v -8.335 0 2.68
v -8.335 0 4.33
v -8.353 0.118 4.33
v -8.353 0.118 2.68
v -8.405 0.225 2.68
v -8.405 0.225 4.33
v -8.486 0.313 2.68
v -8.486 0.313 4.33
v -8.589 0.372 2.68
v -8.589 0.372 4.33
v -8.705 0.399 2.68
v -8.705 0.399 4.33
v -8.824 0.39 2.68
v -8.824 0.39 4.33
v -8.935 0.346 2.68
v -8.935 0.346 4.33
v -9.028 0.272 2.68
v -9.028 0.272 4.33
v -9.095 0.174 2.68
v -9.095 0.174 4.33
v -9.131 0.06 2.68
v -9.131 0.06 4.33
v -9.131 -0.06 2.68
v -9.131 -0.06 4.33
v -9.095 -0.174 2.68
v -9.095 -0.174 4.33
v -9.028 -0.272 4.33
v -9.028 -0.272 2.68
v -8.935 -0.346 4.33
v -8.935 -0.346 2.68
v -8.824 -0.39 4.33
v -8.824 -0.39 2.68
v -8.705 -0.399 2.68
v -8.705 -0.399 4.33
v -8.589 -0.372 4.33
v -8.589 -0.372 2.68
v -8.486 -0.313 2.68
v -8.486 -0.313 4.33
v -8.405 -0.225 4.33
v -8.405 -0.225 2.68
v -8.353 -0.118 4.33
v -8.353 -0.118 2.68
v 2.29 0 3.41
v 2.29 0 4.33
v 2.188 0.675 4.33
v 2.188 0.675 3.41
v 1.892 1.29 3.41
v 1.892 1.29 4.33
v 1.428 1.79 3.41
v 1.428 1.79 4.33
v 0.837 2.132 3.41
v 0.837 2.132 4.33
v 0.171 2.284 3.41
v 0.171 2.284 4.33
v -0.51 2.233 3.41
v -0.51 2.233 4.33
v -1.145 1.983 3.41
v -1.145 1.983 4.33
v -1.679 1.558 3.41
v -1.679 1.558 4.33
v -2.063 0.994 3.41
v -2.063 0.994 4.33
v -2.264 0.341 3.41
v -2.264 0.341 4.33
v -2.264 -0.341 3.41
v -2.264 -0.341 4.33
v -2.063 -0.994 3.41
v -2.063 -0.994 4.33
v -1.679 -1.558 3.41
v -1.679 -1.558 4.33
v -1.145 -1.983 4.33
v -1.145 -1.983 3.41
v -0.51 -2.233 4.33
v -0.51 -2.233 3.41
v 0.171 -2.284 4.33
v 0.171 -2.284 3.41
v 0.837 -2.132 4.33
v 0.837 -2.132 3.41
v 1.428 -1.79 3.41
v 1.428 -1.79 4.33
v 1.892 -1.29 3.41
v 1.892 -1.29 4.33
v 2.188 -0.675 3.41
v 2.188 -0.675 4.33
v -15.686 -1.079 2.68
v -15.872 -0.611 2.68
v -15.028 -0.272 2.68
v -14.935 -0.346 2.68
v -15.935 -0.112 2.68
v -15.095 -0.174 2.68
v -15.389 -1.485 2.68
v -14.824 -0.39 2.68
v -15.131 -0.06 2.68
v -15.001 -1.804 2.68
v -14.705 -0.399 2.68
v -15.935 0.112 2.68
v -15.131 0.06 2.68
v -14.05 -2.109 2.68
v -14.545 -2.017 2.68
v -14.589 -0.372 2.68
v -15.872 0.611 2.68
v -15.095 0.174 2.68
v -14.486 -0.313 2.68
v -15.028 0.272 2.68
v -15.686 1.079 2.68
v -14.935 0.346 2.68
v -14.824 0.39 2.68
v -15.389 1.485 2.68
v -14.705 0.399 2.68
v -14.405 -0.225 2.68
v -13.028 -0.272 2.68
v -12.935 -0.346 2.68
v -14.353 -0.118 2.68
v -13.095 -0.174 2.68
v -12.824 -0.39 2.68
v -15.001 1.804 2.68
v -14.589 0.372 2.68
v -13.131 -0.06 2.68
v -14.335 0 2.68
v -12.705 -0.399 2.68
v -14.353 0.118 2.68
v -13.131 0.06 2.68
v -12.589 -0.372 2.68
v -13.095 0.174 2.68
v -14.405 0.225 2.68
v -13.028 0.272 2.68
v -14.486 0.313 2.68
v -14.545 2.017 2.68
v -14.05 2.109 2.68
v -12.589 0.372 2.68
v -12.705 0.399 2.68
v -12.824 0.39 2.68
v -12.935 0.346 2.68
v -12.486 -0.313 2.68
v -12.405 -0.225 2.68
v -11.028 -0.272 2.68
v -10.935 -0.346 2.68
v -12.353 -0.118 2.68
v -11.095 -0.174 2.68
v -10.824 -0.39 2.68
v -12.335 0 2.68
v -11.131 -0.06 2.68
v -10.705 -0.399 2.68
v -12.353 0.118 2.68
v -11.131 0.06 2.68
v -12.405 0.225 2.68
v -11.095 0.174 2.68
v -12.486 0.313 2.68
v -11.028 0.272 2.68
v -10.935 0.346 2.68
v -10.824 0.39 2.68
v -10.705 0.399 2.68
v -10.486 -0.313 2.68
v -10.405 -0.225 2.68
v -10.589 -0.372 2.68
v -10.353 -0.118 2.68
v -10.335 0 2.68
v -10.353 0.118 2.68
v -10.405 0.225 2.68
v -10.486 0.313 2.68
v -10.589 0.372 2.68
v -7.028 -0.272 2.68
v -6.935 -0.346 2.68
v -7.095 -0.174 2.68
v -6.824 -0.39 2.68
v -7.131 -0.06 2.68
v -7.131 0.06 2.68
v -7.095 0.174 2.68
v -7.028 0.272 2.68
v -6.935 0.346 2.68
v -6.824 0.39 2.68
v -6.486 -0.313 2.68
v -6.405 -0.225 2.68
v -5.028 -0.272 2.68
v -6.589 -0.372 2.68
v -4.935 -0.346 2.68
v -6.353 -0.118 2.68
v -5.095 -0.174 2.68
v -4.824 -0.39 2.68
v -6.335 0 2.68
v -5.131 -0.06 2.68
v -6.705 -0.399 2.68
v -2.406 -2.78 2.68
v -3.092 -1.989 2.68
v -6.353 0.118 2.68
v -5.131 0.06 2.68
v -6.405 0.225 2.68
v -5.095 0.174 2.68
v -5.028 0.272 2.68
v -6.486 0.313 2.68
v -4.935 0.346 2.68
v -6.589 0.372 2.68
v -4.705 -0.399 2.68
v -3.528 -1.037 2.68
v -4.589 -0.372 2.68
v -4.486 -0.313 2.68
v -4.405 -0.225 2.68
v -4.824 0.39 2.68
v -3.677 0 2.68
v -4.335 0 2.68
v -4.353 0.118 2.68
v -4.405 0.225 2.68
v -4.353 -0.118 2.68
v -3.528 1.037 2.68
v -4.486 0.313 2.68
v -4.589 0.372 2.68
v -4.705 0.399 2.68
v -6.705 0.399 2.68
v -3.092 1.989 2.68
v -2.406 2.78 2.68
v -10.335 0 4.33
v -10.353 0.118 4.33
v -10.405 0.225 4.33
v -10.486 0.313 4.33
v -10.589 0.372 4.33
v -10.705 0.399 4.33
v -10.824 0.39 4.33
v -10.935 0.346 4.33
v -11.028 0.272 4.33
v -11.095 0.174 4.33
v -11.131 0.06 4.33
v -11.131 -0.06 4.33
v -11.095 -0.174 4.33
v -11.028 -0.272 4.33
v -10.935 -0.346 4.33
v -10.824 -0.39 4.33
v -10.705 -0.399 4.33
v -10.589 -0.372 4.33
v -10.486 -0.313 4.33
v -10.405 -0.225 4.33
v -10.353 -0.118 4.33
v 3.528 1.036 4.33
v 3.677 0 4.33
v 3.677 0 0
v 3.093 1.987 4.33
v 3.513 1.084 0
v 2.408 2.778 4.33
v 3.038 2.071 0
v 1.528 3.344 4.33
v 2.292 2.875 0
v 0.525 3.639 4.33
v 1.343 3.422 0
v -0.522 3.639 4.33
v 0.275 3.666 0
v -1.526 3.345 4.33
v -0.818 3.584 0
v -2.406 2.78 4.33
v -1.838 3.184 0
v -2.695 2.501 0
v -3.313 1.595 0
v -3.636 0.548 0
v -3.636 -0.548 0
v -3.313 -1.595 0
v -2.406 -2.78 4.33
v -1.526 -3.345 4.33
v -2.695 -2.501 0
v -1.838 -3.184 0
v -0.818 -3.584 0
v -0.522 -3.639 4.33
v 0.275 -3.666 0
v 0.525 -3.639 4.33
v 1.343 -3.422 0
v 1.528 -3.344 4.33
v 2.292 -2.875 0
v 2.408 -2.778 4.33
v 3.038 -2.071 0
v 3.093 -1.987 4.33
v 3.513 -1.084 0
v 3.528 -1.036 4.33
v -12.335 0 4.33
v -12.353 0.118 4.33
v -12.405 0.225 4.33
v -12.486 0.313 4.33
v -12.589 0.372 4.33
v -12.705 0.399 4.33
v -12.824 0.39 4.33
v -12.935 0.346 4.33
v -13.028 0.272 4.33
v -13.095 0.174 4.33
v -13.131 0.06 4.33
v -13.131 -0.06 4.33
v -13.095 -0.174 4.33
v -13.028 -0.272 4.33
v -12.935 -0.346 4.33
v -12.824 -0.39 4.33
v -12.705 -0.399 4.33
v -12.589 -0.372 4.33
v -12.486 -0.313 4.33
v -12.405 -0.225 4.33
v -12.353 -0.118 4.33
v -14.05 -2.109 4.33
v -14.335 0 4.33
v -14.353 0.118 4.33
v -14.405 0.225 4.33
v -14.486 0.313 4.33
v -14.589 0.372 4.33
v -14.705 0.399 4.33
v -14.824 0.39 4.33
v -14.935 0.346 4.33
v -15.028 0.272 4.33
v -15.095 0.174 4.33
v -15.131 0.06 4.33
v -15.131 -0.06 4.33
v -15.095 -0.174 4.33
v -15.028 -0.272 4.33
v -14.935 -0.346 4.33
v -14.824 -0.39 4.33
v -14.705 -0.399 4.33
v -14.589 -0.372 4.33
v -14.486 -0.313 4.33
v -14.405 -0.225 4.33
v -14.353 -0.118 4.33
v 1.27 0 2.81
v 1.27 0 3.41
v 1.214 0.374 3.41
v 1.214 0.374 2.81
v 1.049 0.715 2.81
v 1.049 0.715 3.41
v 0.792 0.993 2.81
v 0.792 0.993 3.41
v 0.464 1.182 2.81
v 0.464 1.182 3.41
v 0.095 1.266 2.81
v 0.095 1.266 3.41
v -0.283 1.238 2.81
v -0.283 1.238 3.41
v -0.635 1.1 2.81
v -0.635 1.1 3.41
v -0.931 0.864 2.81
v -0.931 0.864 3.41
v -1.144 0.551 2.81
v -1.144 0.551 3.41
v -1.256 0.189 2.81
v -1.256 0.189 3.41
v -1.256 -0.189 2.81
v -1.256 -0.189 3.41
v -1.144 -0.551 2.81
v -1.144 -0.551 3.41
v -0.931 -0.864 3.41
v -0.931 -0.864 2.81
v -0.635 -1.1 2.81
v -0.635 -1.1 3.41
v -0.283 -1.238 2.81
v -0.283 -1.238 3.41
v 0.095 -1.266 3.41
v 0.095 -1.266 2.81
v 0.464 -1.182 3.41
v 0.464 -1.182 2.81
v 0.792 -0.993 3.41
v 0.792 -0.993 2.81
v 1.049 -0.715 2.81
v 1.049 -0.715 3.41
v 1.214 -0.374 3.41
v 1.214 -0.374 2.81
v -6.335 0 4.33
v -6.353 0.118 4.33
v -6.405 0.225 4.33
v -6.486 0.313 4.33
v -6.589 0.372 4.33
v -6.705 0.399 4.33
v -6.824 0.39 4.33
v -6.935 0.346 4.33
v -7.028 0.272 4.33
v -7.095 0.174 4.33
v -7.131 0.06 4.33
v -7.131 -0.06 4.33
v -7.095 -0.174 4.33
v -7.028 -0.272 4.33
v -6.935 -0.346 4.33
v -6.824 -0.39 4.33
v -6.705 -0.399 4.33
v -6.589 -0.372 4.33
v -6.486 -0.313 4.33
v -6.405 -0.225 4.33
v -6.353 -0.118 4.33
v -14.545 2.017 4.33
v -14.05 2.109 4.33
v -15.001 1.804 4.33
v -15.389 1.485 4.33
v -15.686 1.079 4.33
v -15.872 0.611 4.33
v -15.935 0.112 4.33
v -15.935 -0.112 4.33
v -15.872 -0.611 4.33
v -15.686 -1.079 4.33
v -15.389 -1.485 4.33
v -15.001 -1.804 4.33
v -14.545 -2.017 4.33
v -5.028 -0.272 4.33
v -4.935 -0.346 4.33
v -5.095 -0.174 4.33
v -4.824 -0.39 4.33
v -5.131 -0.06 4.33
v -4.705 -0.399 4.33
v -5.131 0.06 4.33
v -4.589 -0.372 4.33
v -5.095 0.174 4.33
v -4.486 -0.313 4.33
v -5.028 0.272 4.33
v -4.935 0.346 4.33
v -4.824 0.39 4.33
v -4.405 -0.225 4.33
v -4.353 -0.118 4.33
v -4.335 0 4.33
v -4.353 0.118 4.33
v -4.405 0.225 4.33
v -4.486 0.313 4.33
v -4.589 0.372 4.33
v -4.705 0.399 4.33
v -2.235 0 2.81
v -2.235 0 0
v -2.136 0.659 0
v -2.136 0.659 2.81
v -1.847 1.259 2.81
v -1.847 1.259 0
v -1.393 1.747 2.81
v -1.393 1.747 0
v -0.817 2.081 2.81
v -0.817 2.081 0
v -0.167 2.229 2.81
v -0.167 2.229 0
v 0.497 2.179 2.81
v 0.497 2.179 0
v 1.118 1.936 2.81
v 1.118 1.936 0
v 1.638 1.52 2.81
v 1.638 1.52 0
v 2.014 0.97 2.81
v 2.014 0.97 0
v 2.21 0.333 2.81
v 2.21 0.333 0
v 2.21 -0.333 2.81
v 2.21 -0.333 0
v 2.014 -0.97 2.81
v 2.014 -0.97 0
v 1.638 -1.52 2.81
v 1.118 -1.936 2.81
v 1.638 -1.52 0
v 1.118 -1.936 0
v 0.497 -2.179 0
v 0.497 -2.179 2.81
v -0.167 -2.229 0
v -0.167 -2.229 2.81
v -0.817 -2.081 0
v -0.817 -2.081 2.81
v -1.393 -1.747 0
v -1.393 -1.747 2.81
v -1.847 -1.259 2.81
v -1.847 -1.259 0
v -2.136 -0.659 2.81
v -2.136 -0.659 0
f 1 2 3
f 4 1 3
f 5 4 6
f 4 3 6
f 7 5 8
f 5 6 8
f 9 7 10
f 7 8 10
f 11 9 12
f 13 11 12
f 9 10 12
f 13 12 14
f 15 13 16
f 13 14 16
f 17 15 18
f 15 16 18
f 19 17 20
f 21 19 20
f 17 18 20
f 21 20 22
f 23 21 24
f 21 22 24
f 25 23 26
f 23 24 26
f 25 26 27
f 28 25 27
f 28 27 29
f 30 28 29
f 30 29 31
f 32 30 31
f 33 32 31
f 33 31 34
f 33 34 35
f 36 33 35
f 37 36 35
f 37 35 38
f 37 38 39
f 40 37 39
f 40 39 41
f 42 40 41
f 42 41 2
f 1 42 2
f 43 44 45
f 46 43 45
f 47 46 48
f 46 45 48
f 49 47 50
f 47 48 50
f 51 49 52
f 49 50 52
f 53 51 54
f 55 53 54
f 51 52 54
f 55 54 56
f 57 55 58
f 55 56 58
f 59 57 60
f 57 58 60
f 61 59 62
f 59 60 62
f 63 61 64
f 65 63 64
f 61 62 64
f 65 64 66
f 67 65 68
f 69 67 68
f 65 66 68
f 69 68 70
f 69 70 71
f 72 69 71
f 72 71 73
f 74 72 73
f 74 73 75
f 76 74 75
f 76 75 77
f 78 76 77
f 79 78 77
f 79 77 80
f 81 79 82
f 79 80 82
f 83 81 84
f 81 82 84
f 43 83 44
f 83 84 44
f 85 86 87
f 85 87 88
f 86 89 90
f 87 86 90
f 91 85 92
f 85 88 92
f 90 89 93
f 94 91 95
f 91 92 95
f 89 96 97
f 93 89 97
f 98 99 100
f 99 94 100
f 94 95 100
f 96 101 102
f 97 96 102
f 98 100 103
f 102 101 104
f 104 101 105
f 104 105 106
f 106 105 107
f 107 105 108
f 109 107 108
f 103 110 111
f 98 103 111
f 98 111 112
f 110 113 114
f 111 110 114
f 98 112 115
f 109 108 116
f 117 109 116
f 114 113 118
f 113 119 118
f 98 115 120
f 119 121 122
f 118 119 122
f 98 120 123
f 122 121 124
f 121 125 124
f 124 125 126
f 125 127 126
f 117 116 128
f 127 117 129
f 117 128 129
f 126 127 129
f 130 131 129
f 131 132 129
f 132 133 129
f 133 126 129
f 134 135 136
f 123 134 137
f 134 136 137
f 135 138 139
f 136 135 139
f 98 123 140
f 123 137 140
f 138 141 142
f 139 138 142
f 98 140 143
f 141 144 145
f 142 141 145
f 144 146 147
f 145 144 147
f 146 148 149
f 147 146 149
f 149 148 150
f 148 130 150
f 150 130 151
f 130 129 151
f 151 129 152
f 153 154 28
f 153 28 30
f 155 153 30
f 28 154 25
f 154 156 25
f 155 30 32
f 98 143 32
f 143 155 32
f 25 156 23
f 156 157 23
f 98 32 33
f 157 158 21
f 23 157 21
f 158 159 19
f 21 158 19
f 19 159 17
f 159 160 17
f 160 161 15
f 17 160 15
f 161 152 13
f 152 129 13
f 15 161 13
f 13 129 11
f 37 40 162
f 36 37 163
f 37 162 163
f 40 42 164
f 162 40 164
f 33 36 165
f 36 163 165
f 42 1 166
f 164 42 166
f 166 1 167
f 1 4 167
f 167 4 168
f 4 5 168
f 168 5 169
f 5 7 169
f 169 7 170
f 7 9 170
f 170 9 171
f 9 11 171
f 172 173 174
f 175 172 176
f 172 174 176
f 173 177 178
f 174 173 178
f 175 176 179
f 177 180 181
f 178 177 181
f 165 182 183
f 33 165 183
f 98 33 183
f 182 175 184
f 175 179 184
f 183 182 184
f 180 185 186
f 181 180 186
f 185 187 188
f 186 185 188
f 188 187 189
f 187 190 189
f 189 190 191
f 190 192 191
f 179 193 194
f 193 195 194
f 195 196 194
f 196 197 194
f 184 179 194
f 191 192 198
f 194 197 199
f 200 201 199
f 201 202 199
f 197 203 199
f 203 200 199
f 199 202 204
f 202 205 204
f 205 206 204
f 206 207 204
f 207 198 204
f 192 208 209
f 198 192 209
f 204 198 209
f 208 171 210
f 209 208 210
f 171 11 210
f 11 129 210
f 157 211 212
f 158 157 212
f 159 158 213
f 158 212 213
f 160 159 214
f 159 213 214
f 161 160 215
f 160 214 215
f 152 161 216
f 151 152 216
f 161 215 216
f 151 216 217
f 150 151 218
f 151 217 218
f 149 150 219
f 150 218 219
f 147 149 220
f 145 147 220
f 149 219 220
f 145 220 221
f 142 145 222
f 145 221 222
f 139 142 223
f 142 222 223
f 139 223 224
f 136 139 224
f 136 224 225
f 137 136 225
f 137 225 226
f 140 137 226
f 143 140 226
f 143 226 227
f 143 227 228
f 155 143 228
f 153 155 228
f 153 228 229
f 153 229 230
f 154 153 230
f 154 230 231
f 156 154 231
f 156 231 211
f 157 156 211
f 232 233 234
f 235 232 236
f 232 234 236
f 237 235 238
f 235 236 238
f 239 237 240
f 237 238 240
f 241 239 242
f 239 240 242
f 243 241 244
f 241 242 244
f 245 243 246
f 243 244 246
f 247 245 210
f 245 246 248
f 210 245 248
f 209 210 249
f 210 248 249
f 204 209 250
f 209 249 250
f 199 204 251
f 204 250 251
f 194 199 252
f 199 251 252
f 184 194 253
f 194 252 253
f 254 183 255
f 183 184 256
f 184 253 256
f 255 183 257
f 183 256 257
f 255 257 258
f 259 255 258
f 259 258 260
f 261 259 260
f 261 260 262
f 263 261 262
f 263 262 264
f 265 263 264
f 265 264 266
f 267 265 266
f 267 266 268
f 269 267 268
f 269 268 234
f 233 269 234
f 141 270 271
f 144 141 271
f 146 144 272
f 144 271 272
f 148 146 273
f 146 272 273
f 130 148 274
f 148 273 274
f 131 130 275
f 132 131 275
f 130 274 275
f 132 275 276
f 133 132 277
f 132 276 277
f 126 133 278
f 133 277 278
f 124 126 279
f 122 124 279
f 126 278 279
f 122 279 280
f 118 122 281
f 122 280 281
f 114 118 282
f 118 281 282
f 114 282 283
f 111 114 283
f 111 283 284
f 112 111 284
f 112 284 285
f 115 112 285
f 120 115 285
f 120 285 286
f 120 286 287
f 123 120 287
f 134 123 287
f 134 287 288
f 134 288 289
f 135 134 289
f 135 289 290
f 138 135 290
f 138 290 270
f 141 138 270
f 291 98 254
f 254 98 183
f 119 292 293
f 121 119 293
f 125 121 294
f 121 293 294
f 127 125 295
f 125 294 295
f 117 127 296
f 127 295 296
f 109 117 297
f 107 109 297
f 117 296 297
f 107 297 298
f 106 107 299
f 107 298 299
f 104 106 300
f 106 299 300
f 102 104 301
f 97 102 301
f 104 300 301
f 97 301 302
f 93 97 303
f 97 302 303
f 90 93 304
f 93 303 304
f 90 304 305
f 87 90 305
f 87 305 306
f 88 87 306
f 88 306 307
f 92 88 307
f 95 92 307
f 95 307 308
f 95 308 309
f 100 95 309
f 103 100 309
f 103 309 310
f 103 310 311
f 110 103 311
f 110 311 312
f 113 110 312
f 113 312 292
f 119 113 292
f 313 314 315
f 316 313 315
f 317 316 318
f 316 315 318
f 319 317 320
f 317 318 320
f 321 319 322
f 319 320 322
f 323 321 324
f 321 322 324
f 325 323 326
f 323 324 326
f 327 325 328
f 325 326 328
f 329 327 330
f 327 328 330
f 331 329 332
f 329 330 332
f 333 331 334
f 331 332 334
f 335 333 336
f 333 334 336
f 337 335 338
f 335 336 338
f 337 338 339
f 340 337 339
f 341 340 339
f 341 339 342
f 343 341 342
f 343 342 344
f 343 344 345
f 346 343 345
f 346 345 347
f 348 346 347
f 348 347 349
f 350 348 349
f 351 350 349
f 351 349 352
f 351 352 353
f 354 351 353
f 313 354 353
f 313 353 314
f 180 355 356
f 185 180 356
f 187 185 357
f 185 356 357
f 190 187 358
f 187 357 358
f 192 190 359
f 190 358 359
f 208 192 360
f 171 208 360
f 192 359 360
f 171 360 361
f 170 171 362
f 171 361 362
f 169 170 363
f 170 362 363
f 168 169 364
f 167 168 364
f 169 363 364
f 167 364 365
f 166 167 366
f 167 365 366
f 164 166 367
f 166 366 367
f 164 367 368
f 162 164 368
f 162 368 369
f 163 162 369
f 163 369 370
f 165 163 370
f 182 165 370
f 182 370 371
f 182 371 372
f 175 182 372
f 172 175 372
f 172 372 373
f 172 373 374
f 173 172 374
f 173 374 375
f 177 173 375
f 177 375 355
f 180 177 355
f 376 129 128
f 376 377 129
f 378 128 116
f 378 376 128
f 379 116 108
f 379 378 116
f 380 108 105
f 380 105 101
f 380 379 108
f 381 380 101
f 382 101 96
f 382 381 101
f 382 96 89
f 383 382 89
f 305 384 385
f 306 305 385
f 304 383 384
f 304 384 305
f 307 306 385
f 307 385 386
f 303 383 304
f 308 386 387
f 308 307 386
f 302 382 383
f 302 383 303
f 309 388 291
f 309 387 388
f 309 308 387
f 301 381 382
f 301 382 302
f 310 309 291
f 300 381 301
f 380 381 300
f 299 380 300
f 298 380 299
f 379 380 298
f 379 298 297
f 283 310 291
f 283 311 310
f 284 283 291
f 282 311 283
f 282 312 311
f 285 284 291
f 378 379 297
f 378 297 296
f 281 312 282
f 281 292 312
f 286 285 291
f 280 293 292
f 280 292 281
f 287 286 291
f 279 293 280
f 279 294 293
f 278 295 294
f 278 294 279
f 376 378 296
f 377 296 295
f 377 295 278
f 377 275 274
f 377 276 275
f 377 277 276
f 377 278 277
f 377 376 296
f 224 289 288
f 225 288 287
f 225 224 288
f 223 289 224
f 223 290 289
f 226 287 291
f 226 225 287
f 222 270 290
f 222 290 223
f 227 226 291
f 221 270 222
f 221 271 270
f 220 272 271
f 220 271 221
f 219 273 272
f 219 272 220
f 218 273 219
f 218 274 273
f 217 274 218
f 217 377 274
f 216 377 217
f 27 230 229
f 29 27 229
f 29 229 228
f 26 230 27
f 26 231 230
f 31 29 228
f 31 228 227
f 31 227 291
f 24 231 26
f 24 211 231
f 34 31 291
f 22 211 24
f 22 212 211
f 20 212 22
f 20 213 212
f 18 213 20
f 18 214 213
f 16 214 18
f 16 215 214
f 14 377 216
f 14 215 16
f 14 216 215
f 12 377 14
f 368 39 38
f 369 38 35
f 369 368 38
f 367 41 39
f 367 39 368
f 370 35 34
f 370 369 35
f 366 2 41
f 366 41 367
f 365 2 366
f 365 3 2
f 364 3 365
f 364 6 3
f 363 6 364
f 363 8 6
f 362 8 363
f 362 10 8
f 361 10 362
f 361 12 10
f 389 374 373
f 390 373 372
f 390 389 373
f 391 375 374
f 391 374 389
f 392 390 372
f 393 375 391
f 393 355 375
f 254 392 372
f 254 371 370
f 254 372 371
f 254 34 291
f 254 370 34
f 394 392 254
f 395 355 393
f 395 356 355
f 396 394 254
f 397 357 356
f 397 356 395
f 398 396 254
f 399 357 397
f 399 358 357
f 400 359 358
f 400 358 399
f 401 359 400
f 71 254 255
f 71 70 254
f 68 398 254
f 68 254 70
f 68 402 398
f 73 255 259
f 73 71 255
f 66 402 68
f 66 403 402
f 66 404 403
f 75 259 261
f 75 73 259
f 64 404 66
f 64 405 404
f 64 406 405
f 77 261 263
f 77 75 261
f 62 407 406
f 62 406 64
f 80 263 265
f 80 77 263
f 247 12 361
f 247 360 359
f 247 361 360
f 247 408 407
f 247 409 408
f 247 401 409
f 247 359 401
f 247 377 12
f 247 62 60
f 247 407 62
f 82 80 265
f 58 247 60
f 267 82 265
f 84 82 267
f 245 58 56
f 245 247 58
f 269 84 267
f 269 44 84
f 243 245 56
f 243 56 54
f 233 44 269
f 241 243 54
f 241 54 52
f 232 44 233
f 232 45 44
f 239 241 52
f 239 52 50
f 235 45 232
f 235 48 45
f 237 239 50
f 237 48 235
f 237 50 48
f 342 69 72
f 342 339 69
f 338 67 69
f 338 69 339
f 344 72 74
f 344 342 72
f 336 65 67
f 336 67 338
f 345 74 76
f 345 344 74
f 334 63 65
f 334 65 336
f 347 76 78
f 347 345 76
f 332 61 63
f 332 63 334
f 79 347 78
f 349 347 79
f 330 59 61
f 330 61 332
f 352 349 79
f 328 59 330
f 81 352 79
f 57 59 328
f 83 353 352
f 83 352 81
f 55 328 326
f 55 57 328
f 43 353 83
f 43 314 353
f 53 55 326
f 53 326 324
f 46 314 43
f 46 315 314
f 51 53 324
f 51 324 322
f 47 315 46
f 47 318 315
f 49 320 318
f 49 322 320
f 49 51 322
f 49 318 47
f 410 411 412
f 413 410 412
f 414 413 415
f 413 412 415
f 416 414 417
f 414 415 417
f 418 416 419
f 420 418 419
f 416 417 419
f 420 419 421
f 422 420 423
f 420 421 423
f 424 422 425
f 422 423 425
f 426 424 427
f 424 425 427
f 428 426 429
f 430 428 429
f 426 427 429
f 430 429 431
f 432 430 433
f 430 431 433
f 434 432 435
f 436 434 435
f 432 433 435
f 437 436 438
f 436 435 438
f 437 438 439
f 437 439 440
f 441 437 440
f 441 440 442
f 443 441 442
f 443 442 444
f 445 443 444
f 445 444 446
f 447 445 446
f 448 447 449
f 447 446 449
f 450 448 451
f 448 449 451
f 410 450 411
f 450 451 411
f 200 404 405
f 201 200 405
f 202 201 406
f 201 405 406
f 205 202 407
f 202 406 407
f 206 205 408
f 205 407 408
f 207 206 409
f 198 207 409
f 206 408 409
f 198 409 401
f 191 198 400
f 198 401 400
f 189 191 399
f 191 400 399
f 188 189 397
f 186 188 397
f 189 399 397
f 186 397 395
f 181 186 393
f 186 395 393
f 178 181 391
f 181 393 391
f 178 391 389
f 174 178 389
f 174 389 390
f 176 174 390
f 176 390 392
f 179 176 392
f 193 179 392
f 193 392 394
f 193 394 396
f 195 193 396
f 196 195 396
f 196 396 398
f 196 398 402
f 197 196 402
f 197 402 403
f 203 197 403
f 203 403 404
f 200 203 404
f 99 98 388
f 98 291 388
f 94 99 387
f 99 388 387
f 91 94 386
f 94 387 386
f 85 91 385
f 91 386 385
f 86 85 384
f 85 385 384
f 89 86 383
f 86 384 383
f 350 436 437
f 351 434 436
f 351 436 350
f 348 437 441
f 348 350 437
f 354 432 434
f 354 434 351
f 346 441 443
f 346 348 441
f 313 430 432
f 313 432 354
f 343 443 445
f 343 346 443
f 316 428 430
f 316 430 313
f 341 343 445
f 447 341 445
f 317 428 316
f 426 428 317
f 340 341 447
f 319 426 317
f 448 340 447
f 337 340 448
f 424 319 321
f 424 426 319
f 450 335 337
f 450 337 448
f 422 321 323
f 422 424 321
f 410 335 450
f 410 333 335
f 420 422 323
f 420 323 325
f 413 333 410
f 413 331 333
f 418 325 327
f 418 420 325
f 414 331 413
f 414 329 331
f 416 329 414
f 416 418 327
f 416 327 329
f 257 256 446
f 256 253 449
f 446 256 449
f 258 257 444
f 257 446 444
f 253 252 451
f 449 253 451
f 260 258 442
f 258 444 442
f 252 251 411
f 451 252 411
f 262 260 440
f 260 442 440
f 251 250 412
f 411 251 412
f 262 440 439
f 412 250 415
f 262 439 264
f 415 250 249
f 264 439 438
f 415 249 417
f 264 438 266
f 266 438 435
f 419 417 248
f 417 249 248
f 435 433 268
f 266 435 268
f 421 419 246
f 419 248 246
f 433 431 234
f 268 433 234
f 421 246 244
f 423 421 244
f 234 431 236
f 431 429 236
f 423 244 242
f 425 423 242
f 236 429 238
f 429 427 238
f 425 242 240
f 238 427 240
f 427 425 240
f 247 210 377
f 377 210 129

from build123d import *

# Parameters (mm, degrees)
SKETCH1_R           = 3.67665
BOSS_EXTRUDE1_DEPTH = 4.33
SKETCH2_R           = 2.235
CUT_EXTRUDE1_DEPTH  = 2.81
SKETCH3_R           = 2.29
CUT_EXTRUDE2_DEPTH  = 0.92
SKETCH4_R           = 1.27
CUT_EXTRUDE3_DEPTH  = 7.218006951
BOSS_EXTRUDE2_START = -1.65
BOSS_EXTRUDE2_DEPTH = 1.65
FILLET1_R           = 2
SKETCH6_R           = 0.4
CUT_EXTRUDE4_DEPTH  = 17.917177076


with BuildPart() as part:
    # Sketch1 → Boss-Extrude1 (new body)
    with BuildSketch(Plane.XY):
        Circle(SKETCH1_R)
    extrude(amount=BOSS_EXTRUDE1_DEPTH)

    # Sketch2 → Cut-Extrude1 (cut)
    with BuildSketch(Plane(origin=(0, 0, 0), x_dir=(-1, 0, 0), z_dir=(0, 0, -1))):
        Circle(SKETCH2_R)
    extrude(amount=-CUT_EXTRUDE1_DEPTH, mode=Mode.SUBTRACT)

    # Sketch3 → Cut-Extrude2 (cut)
    with BuildSketch(Plane.XY.offset(4.33)):
        Circle(SKETCH3_R)
    extrude(amount=-CUT_EXTRUDE2_DEPTH, mode=Mode.SUBTRACT)

    # Sketch4 → Cut-Extrude3 (cut, through all)
    with BuildSketch(Plane.XY.offset(3.41)):
        Circle(SKETCH4_R)
    extrude(amount=-CUT_EXTRUDE3_DEPTH, mode=Mode.SUBTRACT)

    # Sketch5 → Boss-Extrude2 (add)
    with BuildSketch(Plane.XY.offset(4.33).offset(BOSS_EXTRUDE2_START)):
        with BuildLine():
            ThreePointArc((-2.406107899, -2.78), (-3.67665, 0), (-2.406107899, 2.78))
            Line((-2.406107899, 2.78), (-15.935, 2))
            Line((-15.935, 2), (-15.935, -2))
            Line((-15.935, -2), (-2.406107899, -2.78))
        make_face()
    extrude(amount=BOSS_EXTRUDE2_DEPTH)

    # Fillet1
    fillet1_edges = [part.edges().sort_by_distance(p)[0] for p in [
        (-15.935, -2, 3.505),
        (-15.935, 2, 3.505),
    ]]
    fillet(fillet1_edges, radius=FILLET1_R)

    # Sketch6 → Cut-Extrude4 (cut, through all)
    with BuildSketch(Plane.XY.offset(4.33)):
        with Locations((-14.735, 0)):
            Circle(SKETCH6_R)
        with Locations((-12.735, 0)):
            Circle(SKETCH6_R)
        with Locations((-10.735, 0)):
            Circle(SKETCH6_R)
        with Locations((-8.735, 0)):
            Circle(SKETCH6_R)
        with Locations((-6.735, 0)):
            Circle(SKETCH6_R)
        with Locations((-4.735, 0)):
            Circle(SKETCH6_R)
    extrude(amount=-CUT_EXTRUDE4_DEPTH, mode=Mode.SUBTRACT)


solid = part.part
